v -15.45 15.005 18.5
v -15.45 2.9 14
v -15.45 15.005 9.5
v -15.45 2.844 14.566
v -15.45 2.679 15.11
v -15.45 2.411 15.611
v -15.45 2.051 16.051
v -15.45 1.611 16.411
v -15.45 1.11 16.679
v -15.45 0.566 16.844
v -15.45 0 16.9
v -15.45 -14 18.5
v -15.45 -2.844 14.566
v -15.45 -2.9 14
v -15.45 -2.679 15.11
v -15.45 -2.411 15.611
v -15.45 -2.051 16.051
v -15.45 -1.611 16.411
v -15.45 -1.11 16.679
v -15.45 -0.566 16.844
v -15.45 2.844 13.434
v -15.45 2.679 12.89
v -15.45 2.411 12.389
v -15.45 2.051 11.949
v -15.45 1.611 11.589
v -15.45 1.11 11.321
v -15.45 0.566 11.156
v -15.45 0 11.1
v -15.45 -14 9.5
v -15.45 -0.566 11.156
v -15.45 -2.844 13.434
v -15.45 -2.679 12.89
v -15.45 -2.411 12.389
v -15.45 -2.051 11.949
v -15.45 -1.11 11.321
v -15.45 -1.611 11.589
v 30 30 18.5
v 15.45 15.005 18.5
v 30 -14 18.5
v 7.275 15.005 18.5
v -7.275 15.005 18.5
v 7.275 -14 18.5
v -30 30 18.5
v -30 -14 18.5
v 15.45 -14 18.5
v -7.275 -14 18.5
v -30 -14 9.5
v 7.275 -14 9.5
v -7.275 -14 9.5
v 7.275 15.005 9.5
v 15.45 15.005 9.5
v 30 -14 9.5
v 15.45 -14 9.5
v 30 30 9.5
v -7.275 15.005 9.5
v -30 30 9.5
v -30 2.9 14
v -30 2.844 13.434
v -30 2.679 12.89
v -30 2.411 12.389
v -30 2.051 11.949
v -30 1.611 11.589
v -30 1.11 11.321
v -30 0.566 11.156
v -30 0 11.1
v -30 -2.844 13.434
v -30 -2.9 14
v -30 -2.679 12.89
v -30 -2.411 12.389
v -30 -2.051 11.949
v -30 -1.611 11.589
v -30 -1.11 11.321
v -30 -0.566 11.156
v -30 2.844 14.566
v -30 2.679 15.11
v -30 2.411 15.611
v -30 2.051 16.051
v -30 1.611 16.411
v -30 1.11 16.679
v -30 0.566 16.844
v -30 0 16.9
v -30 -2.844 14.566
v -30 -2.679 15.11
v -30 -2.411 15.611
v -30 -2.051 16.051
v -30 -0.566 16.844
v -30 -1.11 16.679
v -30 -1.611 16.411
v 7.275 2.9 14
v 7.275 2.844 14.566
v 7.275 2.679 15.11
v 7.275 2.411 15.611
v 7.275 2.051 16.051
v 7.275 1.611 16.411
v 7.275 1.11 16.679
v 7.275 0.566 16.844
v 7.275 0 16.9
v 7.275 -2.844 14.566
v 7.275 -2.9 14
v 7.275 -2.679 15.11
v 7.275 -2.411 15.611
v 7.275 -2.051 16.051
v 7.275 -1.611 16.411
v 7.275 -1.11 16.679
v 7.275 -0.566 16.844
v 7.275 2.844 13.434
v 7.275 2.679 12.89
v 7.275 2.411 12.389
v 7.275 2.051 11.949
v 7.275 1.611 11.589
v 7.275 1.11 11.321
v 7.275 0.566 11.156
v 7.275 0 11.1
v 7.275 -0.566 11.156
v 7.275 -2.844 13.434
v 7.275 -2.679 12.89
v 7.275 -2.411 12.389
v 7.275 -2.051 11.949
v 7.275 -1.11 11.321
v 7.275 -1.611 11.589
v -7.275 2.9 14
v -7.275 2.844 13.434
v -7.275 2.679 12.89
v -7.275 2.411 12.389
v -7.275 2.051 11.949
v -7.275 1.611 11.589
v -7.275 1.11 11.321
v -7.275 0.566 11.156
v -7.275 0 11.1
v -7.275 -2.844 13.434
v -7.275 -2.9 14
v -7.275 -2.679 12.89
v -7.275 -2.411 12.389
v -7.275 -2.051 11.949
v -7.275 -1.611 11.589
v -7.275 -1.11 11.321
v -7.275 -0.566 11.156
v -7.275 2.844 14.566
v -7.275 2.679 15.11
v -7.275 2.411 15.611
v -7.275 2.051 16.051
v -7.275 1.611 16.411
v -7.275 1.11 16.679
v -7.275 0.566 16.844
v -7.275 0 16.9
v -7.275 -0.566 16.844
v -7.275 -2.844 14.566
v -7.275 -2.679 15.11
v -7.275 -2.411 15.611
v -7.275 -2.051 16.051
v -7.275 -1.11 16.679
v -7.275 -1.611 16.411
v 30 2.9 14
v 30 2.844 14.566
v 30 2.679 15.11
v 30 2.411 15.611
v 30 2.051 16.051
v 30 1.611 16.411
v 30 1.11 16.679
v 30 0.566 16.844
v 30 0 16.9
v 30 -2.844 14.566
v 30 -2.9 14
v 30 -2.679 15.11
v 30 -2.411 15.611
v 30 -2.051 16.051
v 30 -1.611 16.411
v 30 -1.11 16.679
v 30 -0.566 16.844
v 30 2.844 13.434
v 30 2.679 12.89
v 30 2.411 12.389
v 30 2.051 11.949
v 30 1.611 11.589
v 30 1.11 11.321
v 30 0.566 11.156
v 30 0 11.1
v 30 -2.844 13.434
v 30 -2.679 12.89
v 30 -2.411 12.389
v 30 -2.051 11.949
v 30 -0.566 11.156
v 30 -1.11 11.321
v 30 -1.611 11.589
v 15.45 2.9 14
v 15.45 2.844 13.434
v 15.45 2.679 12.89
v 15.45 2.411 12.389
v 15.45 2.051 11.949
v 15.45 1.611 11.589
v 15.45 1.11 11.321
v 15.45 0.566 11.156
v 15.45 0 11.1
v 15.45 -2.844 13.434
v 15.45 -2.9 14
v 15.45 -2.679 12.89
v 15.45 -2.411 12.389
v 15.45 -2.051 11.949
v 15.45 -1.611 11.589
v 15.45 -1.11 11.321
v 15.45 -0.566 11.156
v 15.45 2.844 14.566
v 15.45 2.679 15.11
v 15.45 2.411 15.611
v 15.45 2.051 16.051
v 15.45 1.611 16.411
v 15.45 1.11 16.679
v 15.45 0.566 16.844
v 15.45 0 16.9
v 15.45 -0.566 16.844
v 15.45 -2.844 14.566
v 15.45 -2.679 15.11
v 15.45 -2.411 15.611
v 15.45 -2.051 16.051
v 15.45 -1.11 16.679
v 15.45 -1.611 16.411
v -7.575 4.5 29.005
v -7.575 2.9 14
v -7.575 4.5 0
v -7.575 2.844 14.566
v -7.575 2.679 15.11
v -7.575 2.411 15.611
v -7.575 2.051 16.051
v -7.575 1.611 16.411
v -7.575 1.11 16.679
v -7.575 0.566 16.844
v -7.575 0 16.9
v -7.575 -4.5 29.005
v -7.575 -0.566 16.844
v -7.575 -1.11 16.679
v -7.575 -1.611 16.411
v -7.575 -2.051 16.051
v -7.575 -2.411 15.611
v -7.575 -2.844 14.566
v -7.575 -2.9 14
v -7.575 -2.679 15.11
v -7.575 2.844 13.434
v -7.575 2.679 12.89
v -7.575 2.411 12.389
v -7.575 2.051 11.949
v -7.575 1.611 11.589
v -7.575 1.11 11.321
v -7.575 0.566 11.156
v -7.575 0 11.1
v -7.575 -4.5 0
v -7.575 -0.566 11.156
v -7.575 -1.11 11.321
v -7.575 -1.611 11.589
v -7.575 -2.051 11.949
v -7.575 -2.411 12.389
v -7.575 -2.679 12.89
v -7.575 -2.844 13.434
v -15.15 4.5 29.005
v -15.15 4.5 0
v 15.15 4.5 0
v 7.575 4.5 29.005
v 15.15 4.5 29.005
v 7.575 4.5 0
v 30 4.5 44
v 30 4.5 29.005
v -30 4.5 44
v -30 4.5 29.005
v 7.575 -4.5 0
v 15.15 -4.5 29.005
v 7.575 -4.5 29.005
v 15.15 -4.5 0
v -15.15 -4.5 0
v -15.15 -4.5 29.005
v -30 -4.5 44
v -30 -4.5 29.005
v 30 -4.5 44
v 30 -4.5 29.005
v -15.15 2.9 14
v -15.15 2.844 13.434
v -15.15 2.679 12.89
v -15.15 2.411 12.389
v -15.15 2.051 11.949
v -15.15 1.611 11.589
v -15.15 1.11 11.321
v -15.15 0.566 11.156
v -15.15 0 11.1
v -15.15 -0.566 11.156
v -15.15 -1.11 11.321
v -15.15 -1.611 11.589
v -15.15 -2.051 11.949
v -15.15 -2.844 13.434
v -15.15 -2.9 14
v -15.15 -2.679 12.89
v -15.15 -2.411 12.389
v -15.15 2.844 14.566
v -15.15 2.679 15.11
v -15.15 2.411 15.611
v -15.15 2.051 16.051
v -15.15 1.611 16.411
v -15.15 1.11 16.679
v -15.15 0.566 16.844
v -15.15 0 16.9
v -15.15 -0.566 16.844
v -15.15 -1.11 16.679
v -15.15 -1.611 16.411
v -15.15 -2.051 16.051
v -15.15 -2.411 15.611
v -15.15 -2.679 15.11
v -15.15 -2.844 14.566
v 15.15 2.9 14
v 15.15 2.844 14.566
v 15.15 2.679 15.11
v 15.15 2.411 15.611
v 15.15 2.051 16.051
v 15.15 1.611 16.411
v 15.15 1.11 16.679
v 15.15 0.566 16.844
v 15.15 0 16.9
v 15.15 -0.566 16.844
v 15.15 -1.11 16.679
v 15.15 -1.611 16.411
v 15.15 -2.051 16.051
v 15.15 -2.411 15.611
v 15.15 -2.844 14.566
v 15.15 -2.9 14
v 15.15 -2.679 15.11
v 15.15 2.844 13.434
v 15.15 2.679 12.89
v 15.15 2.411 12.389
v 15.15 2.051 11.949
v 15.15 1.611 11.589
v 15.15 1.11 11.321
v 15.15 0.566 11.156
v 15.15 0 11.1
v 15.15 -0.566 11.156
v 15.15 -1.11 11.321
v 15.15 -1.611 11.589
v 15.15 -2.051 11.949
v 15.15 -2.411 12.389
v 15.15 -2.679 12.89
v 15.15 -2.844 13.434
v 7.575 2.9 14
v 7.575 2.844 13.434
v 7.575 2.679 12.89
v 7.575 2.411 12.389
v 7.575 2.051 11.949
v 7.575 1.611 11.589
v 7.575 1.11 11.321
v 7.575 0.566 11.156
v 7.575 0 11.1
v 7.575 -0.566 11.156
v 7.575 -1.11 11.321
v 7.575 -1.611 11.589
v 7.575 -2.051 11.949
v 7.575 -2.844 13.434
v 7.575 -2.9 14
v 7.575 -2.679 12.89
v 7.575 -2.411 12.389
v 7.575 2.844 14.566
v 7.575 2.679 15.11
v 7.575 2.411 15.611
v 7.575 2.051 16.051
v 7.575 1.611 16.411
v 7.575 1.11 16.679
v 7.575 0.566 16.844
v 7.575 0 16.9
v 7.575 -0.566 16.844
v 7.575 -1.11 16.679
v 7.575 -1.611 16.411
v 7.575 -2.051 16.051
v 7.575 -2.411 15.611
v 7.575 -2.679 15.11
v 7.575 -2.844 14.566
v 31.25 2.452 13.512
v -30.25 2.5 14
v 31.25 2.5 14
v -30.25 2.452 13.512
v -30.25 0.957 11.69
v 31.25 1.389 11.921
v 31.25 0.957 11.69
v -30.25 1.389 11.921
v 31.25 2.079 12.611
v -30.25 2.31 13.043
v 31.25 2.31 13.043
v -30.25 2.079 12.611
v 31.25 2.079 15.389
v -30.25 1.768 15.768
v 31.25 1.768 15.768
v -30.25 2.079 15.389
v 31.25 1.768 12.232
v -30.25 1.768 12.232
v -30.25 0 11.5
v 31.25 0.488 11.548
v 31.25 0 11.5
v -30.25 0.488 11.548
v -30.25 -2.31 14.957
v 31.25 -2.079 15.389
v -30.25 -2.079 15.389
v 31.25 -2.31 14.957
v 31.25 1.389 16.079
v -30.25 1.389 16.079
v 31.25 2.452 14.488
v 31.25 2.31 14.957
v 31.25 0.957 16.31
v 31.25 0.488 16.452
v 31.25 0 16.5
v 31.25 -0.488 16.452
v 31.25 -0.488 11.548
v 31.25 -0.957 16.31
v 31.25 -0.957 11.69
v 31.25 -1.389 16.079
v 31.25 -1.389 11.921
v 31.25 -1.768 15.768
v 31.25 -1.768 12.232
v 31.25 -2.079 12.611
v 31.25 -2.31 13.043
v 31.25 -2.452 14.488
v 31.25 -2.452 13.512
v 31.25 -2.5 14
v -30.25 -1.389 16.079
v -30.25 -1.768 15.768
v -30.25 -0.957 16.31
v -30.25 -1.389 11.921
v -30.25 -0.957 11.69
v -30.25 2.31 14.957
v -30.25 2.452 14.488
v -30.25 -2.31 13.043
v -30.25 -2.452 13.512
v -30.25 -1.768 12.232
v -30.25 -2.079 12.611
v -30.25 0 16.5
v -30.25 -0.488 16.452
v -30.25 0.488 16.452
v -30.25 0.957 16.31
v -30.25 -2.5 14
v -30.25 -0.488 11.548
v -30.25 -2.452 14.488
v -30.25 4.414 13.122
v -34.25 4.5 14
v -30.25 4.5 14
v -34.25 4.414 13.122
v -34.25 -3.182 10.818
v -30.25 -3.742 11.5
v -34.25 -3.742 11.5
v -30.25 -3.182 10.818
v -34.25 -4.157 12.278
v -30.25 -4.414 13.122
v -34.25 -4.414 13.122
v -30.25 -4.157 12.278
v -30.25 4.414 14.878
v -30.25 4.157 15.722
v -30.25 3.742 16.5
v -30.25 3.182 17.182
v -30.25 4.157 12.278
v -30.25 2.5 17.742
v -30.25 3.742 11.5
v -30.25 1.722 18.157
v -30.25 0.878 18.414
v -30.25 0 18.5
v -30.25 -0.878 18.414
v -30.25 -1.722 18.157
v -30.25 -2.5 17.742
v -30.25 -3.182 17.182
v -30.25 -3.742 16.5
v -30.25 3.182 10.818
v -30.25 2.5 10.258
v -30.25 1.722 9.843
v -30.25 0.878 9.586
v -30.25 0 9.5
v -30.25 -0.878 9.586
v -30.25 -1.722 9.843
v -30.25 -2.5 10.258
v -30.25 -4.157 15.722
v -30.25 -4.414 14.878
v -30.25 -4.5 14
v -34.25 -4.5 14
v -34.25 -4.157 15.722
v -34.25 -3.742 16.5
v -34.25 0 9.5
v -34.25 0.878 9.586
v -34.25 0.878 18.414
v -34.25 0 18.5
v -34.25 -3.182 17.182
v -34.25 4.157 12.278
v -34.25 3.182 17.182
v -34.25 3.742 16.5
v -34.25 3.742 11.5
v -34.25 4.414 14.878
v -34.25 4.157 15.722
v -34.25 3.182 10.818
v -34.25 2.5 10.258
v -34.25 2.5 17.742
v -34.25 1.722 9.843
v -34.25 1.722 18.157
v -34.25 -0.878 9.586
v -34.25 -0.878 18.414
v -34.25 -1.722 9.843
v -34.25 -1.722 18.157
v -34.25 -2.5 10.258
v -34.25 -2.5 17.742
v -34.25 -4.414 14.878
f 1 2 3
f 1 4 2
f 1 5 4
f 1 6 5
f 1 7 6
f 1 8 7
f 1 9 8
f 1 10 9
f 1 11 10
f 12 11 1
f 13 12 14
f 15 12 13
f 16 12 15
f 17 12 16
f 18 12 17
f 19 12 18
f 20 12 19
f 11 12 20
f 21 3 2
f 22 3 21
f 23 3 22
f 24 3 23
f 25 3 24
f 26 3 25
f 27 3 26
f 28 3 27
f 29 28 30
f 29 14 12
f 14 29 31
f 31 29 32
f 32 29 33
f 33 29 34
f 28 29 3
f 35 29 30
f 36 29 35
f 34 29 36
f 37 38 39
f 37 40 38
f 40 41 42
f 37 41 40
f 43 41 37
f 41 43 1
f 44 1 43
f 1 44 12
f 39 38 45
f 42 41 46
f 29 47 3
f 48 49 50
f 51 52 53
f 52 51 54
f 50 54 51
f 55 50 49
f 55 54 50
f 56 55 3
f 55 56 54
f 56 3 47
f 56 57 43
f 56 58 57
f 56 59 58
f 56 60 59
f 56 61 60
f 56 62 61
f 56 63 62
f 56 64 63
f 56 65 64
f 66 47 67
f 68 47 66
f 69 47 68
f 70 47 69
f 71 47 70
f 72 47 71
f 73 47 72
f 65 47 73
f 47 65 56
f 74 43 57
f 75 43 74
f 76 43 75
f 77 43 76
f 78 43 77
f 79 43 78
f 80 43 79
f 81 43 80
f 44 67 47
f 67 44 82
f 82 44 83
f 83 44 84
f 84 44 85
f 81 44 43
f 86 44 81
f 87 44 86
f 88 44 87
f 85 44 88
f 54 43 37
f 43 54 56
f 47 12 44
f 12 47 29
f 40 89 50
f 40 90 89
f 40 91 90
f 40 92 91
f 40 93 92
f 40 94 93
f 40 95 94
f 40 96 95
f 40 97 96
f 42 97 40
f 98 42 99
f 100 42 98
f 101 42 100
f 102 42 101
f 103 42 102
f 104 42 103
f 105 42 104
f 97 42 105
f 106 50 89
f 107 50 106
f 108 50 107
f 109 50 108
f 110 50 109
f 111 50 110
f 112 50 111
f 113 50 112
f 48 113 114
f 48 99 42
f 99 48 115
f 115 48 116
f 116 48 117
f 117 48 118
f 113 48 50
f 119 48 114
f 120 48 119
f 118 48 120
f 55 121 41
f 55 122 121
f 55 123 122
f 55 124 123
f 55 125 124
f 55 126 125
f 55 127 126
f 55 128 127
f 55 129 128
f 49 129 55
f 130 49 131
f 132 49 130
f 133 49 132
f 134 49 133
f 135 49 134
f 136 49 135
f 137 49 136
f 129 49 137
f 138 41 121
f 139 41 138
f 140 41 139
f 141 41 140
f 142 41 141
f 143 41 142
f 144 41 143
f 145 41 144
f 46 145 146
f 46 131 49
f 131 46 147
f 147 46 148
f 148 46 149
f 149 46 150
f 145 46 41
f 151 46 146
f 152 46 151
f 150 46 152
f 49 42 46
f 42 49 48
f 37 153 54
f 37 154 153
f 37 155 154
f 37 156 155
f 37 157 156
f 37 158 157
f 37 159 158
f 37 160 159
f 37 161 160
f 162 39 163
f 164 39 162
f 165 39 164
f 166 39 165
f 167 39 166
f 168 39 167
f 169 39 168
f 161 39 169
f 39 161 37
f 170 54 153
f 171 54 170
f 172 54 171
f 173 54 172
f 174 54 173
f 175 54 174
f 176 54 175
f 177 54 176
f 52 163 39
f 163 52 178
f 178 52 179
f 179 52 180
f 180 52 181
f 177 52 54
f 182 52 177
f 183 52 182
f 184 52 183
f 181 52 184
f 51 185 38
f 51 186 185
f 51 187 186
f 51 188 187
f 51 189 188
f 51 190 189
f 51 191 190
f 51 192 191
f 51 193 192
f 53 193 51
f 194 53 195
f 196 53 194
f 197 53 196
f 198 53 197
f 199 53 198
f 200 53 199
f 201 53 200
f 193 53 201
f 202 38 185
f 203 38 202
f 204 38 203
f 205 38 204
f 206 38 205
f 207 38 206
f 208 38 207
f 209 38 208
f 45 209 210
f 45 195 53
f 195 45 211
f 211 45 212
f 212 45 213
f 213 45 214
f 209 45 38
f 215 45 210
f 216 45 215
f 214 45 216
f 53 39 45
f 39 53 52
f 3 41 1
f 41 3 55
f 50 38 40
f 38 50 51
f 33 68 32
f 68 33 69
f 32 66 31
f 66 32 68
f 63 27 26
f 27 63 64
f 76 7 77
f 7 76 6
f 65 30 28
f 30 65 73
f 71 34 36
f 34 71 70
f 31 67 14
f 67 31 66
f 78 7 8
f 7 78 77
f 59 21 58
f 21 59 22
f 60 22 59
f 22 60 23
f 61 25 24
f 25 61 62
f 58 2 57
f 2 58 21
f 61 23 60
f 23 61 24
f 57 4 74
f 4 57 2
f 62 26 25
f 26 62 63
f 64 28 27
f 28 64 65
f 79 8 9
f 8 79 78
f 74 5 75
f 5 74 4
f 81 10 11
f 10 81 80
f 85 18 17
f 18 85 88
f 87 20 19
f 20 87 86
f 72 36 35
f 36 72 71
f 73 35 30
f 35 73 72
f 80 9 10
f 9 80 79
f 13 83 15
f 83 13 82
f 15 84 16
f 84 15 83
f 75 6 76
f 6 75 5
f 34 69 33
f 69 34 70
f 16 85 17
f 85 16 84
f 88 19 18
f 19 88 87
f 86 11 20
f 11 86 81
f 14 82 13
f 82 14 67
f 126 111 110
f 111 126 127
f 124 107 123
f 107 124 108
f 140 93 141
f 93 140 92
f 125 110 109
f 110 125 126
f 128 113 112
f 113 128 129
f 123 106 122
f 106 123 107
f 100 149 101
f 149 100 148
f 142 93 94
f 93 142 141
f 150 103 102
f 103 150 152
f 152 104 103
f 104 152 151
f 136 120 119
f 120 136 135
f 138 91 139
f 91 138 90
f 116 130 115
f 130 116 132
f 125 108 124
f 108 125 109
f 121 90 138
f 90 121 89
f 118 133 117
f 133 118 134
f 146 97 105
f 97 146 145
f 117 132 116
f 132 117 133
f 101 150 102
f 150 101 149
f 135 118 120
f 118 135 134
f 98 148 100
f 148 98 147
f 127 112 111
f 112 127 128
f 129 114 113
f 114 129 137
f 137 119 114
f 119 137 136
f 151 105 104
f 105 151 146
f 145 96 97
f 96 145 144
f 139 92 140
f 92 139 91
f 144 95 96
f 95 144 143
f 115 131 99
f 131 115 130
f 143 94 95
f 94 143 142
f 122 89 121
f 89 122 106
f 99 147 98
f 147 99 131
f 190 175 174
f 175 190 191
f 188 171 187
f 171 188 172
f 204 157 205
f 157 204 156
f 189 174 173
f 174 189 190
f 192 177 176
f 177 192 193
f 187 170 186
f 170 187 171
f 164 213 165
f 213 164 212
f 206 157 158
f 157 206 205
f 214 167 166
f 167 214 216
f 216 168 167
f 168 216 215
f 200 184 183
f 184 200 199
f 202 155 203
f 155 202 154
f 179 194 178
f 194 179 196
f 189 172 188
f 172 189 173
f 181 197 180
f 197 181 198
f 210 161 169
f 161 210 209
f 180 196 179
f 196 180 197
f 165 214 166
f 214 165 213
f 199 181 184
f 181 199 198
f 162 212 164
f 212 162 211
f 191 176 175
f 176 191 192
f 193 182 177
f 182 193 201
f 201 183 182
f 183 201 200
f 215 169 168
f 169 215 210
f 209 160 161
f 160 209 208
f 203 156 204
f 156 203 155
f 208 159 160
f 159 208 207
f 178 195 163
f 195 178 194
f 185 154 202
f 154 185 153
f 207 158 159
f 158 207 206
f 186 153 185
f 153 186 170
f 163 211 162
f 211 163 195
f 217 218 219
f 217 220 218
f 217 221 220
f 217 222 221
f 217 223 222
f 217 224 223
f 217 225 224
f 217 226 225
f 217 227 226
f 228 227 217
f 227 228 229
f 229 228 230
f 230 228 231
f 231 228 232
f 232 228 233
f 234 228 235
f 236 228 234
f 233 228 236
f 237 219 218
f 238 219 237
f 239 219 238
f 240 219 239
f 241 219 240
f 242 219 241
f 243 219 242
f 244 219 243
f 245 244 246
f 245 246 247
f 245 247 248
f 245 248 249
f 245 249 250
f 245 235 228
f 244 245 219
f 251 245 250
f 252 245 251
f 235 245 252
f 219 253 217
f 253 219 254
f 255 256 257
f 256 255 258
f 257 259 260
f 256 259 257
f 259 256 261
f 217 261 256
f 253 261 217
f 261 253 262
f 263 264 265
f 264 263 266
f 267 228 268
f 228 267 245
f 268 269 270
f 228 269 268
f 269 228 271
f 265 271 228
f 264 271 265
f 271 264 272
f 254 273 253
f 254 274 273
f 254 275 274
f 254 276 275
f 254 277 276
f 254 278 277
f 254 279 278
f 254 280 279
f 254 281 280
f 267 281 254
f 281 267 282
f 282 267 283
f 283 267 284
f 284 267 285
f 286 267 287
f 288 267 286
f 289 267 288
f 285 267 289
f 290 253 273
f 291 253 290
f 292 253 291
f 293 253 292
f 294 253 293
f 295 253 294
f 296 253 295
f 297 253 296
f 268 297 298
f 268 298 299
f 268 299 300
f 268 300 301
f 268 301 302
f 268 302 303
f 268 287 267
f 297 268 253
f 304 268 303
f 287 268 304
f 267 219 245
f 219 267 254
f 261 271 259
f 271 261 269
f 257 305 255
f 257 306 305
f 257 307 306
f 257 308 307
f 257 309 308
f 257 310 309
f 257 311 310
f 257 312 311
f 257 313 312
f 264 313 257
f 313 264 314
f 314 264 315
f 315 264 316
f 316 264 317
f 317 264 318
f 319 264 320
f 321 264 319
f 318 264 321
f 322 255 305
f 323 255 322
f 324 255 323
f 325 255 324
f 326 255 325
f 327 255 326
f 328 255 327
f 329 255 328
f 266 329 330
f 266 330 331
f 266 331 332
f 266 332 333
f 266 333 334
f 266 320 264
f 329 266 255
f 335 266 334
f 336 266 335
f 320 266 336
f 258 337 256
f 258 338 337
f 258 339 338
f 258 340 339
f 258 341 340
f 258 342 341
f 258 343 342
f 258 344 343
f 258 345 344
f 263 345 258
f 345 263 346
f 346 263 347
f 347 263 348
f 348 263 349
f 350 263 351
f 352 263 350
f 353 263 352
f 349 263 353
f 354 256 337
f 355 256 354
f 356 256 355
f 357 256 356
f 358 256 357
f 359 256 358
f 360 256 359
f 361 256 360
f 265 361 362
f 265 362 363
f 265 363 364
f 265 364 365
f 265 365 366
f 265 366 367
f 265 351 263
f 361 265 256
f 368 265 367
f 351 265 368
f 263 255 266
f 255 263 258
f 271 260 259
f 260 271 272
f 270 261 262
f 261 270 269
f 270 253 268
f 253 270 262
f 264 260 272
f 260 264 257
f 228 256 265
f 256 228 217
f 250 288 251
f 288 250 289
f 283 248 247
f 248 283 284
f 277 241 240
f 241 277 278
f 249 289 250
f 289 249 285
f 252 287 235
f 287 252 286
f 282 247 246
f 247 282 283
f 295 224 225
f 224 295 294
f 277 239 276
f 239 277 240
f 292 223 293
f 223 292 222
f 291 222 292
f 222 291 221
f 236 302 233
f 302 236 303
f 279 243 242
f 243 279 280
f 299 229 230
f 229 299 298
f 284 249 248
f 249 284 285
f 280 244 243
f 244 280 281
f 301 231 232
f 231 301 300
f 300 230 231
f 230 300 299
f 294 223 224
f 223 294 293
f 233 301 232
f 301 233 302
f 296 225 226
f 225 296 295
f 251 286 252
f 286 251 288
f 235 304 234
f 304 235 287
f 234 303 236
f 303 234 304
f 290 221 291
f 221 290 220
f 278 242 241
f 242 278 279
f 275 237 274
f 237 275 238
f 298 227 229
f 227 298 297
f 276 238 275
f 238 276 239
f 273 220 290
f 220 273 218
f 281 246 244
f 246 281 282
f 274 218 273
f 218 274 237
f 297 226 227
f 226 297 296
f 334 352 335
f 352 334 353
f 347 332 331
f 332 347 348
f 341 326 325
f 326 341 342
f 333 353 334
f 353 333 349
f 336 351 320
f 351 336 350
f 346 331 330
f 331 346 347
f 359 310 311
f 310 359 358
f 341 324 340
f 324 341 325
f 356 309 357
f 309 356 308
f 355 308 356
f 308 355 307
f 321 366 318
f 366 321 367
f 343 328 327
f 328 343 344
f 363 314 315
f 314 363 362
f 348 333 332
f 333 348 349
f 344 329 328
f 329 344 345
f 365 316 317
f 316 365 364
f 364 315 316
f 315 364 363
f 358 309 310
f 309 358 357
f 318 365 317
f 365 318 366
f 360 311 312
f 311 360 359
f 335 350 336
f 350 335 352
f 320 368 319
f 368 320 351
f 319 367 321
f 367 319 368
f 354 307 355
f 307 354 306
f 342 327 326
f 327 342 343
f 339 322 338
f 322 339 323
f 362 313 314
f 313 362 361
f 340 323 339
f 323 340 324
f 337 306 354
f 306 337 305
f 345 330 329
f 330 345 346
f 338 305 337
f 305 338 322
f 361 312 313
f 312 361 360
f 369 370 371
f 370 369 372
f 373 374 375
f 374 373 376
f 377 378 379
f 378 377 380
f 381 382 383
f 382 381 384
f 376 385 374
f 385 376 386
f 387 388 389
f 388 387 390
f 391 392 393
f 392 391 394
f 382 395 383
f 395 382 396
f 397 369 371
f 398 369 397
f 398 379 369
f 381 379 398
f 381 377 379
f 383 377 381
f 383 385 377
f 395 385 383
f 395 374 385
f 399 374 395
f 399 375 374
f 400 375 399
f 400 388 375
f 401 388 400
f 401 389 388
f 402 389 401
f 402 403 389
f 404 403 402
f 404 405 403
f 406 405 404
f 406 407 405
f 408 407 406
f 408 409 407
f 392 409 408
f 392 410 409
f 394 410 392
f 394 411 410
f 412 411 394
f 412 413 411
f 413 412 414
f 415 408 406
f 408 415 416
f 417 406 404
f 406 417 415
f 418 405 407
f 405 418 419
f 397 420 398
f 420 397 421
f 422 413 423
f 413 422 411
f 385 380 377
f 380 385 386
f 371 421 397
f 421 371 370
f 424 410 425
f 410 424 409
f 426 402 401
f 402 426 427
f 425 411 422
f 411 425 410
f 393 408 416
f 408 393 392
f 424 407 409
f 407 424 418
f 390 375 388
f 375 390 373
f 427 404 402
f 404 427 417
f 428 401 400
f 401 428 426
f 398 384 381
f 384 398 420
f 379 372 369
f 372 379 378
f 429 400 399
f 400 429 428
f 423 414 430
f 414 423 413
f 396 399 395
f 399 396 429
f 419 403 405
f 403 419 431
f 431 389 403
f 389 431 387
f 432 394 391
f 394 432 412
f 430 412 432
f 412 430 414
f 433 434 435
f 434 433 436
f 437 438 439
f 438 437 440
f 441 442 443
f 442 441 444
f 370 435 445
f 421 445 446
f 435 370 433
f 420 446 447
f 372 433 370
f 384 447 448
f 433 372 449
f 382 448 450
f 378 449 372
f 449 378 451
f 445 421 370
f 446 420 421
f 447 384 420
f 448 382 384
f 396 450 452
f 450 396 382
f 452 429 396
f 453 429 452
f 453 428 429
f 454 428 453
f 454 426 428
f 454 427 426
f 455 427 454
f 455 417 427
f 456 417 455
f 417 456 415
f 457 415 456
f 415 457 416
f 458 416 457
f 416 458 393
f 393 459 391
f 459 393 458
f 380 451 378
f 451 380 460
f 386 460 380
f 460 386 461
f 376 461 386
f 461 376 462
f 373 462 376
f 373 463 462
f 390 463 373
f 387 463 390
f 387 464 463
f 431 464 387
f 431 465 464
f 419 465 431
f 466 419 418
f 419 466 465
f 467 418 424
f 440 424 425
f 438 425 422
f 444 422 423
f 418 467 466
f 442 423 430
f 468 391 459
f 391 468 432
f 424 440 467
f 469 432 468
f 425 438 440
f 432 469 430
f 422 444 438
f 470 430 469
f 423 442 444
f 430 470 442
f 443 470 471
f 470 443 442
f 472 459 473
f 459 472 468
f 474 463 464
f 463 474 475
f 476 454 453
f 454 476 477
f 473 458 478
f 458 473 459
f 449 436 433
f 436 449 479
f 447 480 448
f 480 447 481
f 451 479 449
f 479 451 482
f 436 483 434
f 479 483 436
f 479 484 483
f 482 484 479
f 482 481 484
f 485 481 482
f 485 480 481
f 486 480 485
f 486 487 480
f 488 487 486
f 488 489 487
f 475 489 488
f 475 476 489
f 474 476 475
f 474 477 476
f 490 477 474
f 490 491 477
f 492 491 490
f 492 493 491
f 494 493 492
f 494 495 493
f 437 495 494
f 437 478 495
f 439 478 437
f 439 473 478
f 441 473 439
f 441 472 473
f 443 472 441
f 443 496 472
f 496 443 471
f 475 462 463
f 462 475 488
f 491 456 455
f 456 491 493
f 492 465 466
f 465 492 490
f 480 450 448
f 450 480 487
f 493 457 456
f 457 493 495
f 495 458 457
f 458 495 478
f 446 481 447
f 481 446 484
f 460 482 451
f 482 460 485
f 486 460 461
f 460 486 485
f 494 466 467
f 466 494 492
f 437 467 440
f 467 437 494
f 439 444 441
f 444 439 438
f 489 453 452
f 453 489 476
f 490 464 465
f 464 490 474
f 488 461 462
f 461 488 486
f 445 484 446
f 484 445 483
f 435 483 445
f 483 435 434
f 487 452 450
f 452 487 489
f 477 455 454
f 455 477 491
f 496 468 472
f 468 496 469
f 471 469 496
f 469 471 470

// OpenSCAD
$fn = 32;

// ------------------------------------------------------------------------
// Butt hinge: hinge 60 mm, leaf swung 270 deg
// Every part is its own module, assembly() places every instance.
// ------------------------------------------------------------------------

// --- part 1 ---
module hinge_base() {
  difference() {
    union() {
      translate([-30, -14, -4.5]) cube([14.55, 44, 9]);
      translate([-7.275, -14, -4.5]) cube([14.55, 44, 9]);
      translate([15.45, -14, -4.5]) cube([14.55, 44, 9]);
      translate([-30, 15.005, -4.5]) cube([60, 14.995, 9]);
    }
    translate([-22.725, 0, 0]) rotate([0, 90, 0]) cylinder(h = 16.55, d = 5.8, center = true);
    translate([0, 0, 0]) rotate([0, 90, 0]) cylinder(h = 16.55, d = 5.8, center = true);
    translate([22.725, 0, 0]) rotate([0, 90, 0]) cylinder(h = 16.55, d = 5.8, center = true);
  }
}

// --- part 2 ---
module hinge_mover() {
  difference() {
    union() {
      translate([-15.15, -30, -4.5]) cube([7.575, 44, 9]);
      translate([7.575, -30, -4.5]) cube([7.575, 44, 9]);
      translate([-30, -30, -4.5]) cube([60, 14.995, 9]);
    }
    translate([-11.362, 0, 0]) rotate([0, 90, 0]) cylinder(h = 9.575, d = 5.8, center = true);
    translate([11.362, 0, 0]) rotate([0, 90, 0]) cylinder(h = 9.575, d = 5.8, center = true);
  }
}

// --- part 3 ---
module hinge_pin() {
  rotate([0, 90, 0]) cylinder(h = 62.5, d = 5, center = true);
  translate([-34.25, 0, 0]) rotate([0, 90, 0]) cylinder(h = 4, d = 9);
}

// --- assembly ---
module assembly() {
  color([0.80, 0.24, 0.20]) translate([0, 0, 14]) rotate([0, 0, 0]) hinge_base();
  color([0.20, 0.45, 0.75]) translate([0, 0, 14]) rotate([270, 0, 0]) hinge_mover();
  color([0.25, 0.62, 0.32]) translate([0, 0, 14]) rotate([0, 0, 0]) hinge_pin();
}

assembly();
